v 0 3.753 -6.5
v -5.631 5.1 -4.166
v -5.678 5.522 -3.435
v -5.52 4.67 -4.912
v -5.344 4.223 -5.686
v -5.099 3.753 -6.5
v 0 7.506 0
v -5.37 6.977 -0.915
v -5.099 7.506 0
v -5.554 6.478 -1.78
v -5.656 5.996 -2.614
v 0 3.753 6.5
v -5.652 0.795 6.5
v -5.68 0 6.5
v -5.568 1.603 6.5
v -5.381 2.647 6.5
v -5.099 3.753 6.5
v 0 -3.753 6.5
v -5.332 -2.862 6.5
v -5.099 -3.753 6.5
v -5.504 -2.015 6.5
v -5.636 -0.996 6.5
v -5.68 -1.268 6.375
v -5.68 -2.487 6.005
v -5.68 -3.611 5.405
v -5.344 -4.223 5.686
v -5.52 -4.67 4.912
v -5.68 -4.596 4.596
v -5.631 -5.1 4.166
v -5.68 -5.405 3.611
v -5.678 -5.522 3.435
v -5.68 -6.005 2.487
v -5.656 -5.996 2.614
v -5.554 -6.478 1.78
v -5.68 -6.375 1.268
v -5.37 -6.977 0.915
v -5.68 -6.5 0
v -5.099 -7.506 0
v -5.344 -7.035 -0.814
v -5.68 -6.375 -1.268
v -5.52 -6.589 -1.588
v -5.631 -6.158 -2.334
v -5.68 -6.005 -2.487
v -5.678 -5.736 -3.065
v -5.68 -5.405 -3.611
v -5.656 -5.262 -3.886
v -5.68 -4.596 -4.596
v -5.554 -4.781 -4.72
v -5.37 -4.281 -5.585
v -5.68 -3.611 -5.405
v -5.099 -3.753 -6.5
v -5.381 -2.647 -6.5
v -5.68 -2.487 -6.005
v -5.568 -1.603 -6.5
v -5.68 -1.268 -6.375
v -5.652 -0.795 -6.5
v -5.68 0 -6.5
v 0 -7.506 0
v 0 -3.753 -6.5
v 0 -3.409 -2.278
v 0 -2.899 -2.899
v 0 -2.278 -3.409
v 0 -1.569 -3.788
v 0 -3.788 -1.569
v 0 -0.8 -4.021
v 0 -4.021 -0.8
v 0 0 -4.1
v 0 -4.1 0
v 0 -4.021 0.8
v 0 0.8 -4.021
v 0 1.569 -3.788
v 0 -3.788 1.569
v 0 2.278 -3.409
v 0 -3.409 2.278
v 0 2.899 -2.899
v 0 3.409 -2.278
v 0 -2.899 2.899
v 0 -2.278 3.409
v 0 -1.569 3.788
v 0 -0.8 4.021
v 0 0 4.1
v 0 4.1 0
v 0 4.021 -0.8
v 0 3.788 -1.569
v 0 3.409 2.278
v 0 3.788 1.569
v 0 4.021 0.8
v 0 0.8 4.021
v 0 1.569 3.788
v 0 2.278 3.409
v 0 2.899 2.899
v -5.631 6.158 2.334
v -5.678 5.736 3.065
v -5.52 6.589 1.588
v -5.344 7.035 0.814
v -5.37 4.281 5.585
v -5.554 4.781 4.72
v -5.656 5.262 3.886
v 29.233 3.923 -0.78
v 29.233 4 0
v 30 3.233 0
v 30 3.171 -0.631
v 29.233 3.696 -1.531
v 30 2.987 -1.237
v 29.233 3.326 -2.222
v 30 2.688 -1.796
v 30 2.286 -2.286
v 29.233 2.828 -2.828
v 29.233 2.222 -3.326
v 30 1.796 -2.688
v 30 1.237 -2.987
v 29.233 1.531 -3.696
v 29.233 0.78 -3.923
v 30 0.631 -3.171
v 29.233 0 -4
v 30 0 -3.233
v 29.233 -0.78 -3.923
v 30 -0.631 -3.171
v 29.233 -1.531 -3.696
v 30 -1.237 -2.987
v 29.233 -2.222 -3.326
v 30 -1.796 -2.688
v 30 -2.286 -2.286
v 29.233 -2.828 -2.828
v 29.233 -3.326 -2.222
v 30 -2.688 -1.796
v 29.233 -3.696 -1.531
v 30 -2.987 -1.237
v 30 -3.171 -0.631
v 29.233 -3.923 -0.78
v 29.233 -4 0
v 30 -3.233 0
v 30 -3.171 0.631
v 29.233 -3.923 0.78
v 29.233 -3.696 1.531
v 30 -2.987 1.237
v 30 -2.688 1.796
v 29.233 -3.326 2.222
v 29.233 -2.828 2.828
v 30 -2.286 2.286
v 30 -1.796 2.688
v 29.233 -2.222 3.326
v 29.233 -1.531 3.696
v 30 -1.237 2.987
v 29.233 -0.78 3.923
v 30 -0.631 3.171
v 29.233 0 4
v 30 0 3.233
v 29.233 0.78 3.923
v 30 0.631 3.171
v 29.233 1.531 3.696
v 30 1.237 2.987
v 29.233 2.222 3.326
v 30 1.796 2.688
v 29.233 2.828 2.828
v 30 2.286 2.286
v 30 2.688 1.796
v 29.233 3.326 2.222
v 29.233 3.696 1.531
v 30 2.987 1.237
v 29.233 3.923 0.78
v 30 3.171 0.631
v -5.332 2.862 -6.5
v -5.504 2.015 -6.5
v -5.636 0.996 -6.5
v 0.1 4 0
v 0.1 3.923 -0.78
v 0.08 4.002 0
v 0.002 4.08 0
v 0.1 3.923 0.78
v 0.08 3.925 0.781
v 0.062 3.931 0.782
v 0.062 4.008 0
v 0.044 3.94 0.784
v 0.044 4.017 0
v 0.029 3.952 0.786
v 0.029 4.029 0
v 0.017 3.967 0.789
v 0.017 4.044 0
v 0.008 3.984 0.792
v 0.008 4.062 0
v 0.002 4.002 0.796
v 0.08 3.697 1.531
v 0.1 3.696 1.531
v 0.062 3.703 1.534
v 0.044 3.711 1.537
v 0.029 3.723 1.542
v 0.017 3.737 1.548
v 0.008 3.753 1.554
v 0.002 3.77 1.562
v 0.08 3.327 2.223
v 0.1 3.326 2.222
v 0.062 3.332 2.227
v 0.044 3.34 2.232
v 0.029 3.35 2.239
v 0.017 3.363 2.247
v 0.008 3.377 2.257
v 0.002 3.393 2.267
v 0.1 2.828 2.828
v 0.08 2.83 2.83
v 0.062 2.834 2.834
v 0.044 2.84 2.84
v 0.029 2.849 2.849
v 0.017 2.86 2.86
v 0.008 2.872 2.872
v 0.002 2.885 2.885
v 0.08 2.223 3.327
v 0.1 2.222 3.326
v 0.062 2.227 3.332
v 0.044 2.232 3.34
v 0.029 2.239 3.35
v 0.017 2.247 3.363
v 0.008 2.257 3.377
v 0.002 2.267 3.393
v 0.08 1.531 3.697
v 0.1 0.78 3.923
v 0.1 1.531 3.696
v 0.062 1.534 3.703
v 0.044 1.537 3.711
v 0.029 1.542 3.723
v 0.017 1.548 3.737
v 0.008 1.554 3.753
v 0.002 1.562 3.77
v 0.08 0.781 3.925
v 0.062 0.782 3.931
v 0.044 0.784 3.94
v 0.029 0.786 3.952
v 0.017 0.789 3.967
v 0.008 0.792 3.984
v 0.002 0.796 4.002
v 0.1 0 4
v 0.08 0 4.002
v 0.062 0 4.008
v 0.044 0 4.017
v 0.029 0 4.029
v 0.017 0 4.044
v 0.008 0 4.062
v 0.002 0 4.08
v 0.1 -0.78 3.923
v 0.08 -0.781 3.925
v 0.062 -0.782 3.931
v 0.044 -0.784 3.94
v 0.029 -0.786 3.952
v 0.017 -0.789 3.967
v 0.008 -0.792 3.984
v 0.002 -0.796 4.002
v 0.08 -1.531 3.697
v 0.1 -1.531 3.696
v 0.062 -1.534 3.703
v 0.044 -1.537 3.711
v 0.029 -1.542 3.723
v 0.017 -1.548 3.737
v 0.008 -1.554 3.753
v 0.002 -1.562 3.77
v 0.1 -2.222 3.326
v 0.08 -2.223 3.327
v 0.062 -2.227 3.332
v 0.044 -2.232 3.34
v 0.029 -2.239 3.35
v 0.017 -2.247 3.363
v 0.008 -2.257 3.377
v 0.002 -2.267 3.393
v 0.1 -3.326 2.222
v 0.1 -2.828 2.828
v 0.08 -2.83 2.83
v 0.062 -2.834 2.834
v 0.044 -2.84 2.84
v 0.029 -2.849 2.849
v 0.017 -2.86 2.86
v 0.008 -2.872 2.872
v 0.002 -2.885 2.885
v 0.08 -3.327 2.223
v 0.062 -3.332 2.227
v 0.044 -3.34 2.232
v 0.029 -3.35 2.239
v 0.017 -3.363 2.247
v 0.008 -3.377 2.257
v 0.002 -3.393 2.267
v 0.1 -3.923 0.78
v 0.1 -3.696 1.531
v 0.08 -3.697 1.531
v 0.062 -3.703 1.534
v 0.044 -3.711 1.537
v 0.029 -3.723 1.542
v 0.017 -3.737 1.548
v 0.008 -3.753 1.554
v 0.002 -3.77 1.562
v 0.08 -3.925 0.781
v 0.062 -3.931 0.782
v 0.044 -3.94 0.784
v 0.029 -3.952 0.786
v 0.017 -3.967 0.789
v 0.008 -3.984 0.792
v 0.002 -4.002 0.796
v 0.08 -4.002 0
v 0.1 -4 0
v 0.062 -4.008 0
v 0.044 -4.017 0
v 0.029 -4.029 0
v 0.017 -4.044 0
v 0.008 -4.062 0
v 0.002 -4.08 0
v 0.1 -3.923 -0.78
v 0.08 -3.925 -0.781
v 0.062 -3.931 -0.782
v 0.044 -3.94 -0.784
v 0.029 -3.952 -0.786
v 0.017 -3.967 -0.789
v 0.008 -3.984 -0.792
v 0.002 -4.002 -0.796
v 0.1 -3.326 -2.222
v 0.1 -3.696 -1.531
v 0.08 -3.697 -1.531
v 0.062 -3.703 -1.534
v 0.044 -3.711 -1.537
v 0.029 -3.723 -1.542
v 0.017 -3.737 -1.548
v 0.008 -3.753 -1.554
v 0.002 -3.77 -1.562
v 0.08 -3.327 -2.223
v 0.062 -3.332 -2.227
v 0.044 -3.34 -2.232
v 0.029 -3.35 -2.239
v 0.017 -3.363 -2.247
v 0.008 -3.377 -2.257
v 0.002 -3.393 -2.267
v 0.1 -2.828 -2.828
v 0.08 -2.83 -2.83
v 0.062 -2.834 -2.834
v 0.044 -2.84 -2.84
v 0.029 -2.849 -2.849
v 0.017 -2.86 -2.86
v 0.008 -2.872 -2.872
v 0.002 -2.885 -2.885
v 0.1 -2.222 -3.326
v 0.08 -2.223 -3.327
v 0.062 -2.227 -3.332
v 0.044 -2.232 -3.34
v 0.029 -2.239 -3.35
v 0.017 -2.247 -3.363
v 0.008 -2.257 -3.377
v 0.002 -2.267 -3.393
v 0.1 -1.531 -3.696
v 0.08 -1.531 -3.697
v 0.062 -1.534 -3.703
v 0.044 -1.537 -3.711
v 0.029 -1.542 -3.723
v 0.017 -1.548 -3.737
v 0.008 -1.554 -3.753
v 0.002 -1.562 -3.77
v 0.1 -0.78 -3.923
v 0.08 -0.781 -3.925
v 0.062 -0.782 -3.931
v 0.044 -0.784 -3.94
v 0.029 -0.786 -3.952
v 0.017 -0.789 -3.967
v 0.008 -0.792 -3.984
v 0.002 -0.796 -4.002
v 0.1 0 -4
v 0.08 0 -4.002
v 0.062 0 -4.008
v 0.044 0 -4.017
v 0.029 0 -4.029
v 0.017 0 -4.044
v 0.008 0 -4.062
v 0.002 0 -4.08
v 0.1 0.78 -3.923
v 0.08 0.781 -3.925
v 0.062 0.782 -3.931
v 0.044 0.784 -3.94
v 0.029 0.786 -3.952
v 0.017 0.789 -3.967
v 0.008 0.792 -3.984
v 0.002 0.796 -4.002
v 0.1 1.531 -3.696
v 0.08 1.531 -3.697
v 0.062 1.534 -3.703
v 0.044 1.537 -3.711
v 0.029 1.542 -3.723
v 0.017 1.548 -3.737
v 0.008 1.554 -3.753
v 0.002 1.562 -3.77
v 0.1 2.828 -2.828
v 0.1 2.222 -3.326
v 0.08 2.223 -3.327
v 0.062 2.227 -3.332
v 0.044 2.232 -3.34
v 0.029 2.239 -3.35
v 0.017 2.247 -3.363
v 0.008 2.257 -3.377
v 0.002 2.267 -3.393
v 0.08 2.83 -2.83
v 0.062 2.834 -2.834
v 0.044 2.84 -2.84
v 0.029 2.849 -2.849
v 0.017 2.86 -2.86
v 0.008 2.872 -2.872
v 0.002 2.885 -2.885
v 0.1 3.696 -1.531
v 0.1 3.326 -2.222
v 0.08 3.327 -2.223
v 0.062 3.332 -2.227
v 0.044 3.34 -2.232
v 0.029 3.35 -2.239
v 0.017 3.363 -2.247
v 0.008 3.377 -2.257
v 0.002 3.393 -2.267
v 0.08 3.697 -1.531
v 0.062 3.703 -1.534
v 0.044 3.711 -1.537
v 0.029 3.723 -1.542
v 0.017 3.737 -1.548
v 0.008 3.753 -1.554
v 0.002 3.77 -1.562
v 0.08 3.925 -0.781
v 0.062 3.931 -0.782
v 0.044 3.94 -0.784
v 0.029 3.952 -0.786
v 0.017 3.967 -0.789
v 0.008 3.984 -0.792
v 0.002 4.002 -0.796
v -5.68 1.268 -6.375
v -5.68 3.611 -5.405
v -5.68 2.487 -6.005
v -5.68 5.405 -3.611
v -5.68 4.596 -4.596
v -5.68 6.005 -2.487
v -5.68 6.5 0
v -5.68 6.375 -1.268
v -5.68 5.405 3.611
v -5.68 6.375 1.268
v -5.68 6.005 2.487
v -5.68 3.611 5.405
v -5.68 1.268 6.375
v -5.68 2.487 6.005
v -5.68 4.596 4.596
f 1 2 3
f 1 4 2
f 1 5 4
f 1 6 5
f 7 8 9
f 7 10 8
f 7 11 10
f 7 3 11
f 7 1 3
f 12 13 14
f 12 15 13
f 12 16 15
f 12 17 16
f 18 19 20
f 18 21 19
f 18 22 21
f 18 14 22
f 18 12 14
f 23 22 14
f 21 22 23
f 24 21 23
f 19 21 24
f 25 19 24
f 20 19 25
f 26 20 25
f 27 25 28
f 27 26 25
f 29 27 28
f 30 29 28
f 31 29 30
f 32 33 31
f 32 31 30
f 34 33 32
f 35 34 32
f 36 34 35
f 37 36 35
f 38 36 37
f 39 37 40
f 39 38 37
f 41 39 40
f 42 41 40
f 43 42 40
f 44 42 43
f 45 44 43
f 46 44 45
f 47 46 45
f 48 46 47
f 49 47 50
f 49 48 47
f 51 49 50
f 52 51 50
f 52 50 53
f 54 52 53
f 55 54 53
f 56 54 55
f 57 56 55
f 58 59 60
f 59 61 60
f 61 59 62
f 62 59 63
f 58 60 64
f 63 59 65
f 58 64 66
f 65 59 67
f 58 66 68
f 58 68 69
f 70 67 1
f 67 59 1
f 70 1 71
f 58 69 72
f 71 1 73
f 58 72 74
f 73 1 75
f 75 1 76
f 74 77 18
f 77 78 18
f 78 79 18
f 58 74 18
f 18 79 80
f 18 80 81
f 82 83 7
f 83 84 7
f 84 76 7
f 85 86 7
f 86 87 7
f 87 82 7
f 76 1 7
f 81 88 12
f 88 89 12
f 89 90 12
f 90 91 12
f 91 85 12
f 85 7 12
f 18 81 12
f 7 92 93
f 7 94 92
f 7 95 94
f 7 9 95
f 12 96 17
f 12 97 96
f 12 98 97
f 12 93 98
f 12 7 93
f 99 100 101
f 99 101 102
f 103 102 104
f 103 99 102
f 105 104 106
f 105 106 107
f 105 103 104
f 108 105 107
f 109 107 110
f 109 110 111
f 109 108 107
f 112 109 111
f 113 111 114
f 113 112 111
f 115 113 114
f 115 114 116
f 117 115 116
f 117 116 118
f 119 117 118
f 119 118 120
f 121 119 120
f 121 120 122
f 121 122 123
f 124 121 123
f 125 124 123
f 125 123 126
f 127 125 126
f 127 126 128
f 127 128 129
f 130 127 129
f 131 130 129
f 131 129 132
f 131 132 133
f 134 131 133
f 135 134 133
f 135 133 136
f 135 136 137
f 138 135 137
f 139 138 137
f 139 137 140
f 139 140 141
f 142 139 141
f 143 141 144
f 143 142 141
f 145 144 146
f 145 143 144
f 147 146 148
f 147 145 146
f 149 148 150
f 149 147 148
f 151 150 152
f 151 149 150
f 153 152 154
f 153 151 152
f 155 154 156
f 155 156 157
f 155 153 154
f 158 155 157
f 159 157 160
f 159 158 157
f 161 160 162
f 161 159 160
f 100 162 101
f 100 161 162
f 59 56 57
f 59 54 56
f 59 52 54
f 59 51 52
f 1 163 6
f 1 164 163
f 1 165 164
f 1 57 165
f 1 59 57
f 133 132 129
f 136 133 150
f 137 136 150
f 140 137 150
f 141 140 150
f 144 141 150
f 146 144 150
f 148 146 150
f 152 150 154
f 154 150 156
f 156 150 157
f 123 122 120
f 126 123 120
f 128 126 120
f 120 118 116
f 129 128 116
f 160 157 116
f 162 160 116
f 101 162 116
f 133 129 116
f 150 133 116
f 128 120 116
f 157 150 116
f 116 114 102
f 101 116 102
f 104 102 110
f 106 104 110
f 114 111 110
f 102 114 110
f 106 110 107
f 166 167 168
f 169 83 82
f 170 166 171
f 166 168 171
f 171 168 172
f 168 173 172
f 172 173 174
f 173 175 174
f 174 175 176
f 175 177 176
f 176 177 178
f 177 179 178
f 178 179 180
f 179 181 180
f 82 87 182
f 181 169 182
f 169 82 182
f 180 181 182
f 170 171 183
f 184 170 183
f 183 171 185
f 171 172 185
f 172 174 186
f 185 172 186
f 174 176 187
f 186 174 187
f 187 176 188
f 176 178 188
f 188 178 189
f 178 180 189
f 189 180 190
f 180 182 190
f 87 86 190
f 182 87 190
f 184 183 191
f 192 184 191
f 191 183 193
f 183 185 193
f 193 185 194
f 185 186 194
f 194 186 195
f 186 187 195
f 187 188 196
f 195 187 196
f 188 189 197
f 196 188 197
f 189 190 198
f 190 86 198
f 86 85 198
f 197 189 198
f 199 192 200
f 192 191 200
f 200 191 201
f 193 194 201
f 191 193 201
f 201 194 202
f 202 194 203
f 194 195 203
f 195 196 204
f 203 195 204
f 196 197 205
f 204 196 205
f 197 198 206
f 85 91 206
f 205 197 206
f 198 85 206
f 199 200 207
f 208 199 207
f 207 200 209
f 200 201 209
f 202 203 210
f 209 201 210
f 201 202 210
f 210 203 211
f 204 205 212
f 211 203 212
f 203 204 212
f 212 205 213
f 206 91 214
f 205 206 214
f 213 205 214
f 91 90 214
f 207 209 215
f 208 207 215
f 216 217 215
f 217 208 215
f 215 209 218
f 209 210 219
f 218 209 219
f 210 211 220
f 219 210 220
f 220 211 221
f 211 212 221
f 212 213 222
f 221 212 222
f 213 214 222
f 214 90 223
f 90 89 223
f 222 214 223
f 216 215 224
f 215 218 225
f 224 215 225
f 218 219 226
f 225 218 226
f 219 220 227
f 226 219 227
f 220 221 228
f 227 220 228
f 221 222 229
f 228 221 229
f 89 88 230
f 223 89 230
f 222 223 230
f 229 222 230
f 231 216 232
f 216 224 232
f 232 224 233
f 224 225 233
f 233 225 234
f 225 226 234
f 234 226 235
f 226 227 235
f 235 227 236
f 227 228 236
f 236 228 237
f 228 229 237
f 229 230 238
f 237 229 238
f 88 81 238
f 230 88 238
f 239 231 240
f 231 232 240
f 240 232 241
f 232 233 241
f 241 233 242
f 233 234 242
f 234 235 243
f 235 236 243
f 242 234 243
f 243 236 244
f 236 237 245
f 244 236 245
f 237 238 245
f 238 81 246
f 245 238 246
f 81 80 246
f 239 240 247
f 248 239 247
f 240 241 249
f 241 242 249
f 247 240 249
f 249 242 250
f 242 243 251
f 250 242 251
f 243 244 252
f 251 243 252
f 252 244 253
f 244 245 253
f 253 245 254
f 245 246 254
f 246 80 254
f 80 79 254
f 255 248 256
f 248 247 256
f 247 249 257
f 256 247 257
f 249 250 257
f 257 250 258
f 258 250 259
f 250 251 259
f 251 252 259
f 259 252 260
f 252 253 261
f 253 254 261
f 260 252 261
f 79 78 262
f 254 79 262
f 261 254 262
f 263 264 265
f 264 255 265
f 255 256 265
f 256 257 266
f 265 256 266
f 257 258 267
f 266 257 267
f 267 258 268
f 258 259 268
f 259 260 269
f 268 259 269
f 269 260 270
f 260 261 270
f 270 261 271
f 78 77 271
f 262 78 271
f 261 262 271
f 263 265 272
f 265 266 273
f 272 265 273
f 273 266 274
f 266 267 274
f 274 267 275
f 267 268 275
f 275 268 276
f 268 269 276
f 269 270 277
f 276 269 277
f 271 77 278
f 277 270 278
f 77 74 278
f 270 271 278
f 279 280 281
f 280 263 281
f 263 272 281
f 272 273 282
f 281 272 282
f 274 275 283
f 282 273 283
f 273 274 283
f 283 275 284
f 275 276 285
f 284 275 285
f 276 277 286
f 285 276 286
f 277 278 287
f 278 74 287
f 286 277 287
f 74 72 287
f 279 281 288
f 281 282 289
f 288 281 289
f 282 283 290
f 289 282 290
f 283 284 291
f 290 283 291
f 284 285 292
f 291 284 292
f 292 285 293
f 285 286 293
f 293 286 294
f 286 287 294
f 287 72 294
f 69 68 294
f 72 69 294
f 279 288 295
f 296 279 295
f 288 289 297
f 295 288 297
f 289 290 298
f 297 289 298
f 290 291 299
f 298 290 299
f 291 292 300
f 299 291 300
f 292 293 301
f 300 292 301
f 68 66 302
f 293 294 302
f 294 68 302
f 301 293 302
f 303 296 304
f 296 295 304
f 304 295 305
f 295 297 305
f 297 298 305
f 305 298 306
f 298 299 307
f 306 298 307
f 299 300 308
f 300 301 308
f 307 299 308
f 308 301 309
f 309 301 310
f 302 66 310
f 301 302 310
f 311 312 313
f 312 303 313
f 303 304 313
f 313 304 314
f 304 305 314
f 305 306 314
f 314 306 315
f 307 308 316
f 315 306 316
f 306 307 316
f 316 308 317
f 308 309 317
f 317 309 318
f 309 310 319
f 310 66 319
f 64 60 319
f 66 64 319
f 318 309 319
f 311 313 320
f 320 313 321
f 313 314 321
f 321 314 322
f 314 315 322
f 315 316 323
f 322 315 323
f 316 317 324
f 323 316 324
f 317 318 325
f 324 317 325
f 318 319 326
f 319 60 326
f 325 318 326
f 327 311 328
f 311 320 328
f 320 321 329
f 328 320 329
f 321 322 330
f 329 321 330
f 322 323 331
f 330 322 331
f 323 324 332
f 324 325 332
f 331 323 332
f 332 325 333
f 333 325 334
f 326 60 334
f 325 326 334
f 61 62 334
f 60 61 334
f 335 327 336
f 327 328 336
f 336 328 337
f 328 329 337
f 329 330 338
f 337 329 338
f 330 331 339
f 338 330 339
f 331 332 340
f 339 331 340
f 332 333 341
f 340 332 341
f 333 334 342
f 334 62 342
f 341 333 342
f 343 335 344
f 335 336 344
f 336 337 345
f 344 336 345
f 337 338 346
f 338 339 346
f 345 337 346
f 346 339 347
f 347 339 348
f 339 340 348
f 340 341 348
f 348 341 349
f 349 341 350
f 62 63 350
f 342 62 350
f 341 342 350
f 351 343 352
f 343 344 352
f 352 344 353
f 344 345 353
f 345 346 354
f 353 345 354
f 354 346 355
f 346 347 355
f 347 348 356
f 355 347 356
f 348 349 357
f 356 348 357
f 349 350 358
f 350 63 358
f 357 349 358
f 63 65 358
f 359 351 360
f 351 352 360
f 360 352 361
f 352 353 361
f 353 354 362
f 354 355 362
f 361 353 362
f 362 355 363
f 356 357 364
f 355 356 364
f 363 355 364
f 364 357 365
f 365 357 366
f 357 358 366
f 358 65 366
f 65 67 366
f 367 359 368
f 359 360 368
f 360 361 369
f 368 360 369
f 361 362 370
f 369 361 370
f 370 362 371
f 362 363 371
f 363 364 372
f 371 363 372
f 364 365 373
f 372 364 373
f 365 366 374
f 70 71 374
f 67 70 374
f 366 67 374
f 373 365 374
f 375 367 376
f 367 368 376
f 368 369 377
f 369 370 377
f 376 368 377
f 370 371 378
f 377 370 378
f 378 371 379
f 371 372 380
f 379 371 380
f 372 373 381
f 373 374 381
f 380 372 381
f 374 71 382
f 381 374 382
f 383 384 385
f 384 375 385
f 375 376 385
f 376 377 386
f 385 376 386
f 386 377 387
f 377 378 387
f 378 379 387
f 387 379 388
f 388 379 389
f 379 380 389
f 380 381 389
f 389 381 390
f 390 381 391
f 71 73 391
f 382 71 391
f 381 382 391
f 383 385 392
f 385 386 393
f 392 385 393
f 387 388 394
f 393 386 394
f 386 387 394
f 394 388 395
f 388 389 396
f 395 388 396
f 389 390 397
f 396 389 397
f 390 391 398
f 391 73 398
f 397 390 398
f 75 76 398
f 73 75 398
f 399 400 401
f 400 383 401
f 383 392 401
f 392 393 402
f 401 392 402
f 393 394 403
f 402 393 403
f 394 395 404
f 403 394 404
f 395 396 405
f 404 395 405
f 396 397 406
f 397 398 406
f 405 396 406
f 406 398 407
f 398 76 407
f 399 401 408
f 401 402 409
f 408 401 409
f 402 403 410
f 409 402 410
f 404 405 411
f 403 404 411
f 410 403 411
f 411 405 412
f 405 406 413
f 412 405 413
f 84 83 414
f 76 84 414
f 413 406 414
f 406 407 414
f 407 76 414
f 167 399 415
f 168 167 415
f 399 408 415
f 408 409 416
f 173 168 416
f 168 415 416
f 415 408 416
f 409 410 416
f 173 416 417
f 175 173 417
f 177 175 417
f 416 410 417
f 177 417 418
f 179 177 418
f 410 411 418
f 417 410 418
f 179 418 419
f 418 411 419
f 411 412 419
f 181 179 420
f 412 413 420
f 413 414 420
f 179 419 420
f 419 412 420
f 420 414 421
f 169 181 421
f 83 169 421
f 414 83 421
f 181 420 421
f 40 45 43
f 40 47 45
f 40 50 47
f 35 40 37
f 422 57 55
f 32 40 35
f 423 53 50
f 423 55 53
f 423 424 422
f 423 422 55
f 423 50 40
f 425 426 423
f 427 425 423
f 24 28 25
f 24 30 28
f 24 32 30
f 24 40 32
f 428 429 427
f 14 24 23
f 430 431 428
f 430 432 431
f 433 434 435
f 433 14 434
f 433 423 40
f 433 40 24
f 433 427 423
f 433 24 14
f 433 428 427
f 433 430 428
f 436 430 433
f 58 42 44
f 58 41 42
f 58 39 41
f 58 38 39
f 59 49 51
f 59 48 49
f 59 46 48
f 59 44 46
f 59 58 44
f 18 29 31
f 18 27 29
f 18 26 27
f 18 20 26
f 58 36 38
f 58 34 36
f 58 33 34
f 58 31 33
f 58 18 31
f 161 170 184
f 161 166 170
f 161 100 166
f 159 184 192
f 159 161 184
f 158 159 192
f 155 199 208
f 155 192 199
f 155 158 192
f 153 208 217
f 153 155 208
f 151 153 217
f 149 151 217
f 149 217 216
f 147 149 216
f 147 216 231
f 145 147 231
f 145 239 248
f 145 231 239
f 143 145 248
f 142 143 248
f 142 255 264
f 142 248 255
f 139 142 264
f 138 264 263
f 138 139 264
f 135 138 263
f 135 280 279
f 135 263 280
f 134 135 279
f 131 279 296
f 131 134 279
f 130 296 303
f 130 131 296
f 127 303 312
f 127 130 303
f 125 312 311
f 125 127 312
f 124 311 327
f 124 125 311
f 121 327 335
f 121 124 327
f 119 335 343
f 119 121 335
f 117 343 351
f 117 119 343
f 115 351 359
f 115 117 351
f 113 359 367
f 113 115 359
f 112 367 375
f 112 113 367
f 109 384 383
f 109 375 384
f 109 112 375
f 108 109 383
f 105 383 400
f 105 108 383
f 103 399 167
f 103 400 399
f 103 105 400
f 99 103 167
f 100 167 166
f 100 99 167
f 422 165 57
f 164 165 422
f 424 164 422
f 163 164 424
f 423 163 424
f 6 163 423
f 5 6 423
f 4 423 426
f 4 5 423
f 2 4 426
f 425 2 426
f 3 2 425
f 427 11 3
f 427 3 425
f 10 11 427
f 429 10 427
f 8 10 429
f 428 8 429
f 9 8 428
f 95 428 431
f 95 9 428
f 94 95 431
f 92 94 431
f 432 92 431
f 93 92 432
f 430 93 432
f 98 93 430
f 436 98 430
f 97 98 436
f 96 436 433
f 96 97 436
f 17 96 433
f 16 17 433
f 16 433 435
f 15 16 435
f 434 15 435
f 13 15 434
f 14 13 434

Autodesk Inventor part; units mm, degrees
ref_plane "YZ Plane" through (0, 0, 0) normal (1, 0, 0) x (0, 1, 0)
ref_plane "XZ Plane" through (0, 0, 0) normal (0, 1, 0) x (-1, 0, 0)
sketch "Sketch1" plane through (0, 0, 0) normal (0, 0, 1) x (1, 0, 0)
  line L0 (0, 4) -> (30, 4)
  line L1 (30, 4) -> (30, 0)
  line L2 (30, 0) -> (0, 0)
  line L3 (-6, 0) -> (36, 0) projected
  line L4 (0, -0.8) -> (0, 4.8) projected
  line L5 (0, 4) -> (0, 0)
  dimension "d2" = 8
  dimension "d59" = 30
revolve "Body" add sketch "Sketch1" angle 360 about axis through (30, 0, 0) along (-1, 0, 0)
sketch "Sketch2" plane through (0, 0, 0) normal (-1, 0, 0) x (0, 0, 1)
  line L0 (0, 7.5056) -> (6.5, 3.7528)
  line L1 (6.5, 3.7528) -> (6.5, -3.7528)
  line L2 (6.5, -3.7528) -> (0, -7.5056)
  line L3 (0, -7.5056) -> (-6.5, -3.7528)
  line L4 (-6.5, -3.7528) -> (-6.5, 3.7528)
  line L5 (-6.5, 3.7528) -> (0, 7.5056)
  line L6 (-9.1, 0) -> (9.1, 0) projected
  line L7 (0, 10.5078) -> (0, -10.5078) projected
  point P0 (0, 0)
  point P1 (0, 0)
  dimension "d11" = 13
extrude "Head" add sketch "Sketch2" along normal blind 5.68
sketch "Sketch4" plane through (0, 0, 0) normal (0, 0, 1) x (1, 0, 0)
  line L0 (-4.9294, 7.8) -> (-5.68, 6.5)
  line L1 (-1.1, 0) -> (-0.234, 0)
  line L2 (-6.7692, 0) -> (0.8552, 0) projected
  line L3 (-5.68, 7.8) -> (-4.9294, 7.8)
  line L4 (-5.68, 6.5) -> (-5.68, 7.8)
  line L5 (0, 9.36) -> (0, -1.56) projected
  dimension "d65" = 13
  dimension "d67" = 30
  dimension "d68" = 15.6
  dimension "d69" = 5.68
revolve "Chamfer1" cut sketch "Sketch4" angle 360 about axis through (-1.1, 0, 0) along (1, 0, 0)
thread "Thread" size "M8x1.25" class "6g" standard "ISO Metric profile" length 22
chamfer "Chamfer2" distance 0.7668 distance2 0.7669 1 edges at (30, -4, 0) measured on face at (30, -0.998, 0.8842)
fillet "Fillet" radius 0.1 1 edges at (0, -4, 0)
ref_plane "Work Plane1" through (1.525, 0, 0) normal (0, 0, 1) x (1, 0, 0)
equation "\"d2\" = GD"
equation "\"d59\" = NLG"
equation "\"d11\" = SW"
equation "\"d3\" = KOH"
equation "\"d15\" = GEL"
equation "\"d6\" = -0.5 * SPD + 0.5 * GD"
equation "\"d71\" = RR"
equation "\"d65\" = SW"
equation "\"d67\" = ANG1"
equation "\"d68\" = 1.2 * SW"
equation "\"d69\" = KOH"
equation "\"NLG\" = 30"
equation "\"GD\" = NND"
equation "\"BDM\" = NND"
equation "\"KOH\" = 5.68"
equation "\"GEL\" = 22"
equation "\"SW\" = 13"
equation "\"SW0\" = SW"
equation "\"SPD\" = NND - 1.2269 * PTC"
equation "\"SD2\" = NND"
equation "\"SD\" = 0"
equation "\"ANG1\" = 30deg"
equation "\"GAL\" = 0.61345 * PTC"
equation "\"GUL\" = 0.61345 * PTC"
equation "\"RR\" = 0.1"
equation "\"RR1\" = 0.4"
equation "\"GD1\" = THREADDIA - 1.2269 * PTC"
equation "\"THREADDIA\" = 8"
equation "\"TOA\" = 30deg"
equation "\"PTC\" = 1.25"
equation "\"KOH1\" = 3.7"
equation "\"NND\" = 8"
equation "\"E0\" = 1.155 * SW"
properties part number "ANSI B18.2.3.5M - M8 x 1.25 x 30" material "Steel, Mild"
